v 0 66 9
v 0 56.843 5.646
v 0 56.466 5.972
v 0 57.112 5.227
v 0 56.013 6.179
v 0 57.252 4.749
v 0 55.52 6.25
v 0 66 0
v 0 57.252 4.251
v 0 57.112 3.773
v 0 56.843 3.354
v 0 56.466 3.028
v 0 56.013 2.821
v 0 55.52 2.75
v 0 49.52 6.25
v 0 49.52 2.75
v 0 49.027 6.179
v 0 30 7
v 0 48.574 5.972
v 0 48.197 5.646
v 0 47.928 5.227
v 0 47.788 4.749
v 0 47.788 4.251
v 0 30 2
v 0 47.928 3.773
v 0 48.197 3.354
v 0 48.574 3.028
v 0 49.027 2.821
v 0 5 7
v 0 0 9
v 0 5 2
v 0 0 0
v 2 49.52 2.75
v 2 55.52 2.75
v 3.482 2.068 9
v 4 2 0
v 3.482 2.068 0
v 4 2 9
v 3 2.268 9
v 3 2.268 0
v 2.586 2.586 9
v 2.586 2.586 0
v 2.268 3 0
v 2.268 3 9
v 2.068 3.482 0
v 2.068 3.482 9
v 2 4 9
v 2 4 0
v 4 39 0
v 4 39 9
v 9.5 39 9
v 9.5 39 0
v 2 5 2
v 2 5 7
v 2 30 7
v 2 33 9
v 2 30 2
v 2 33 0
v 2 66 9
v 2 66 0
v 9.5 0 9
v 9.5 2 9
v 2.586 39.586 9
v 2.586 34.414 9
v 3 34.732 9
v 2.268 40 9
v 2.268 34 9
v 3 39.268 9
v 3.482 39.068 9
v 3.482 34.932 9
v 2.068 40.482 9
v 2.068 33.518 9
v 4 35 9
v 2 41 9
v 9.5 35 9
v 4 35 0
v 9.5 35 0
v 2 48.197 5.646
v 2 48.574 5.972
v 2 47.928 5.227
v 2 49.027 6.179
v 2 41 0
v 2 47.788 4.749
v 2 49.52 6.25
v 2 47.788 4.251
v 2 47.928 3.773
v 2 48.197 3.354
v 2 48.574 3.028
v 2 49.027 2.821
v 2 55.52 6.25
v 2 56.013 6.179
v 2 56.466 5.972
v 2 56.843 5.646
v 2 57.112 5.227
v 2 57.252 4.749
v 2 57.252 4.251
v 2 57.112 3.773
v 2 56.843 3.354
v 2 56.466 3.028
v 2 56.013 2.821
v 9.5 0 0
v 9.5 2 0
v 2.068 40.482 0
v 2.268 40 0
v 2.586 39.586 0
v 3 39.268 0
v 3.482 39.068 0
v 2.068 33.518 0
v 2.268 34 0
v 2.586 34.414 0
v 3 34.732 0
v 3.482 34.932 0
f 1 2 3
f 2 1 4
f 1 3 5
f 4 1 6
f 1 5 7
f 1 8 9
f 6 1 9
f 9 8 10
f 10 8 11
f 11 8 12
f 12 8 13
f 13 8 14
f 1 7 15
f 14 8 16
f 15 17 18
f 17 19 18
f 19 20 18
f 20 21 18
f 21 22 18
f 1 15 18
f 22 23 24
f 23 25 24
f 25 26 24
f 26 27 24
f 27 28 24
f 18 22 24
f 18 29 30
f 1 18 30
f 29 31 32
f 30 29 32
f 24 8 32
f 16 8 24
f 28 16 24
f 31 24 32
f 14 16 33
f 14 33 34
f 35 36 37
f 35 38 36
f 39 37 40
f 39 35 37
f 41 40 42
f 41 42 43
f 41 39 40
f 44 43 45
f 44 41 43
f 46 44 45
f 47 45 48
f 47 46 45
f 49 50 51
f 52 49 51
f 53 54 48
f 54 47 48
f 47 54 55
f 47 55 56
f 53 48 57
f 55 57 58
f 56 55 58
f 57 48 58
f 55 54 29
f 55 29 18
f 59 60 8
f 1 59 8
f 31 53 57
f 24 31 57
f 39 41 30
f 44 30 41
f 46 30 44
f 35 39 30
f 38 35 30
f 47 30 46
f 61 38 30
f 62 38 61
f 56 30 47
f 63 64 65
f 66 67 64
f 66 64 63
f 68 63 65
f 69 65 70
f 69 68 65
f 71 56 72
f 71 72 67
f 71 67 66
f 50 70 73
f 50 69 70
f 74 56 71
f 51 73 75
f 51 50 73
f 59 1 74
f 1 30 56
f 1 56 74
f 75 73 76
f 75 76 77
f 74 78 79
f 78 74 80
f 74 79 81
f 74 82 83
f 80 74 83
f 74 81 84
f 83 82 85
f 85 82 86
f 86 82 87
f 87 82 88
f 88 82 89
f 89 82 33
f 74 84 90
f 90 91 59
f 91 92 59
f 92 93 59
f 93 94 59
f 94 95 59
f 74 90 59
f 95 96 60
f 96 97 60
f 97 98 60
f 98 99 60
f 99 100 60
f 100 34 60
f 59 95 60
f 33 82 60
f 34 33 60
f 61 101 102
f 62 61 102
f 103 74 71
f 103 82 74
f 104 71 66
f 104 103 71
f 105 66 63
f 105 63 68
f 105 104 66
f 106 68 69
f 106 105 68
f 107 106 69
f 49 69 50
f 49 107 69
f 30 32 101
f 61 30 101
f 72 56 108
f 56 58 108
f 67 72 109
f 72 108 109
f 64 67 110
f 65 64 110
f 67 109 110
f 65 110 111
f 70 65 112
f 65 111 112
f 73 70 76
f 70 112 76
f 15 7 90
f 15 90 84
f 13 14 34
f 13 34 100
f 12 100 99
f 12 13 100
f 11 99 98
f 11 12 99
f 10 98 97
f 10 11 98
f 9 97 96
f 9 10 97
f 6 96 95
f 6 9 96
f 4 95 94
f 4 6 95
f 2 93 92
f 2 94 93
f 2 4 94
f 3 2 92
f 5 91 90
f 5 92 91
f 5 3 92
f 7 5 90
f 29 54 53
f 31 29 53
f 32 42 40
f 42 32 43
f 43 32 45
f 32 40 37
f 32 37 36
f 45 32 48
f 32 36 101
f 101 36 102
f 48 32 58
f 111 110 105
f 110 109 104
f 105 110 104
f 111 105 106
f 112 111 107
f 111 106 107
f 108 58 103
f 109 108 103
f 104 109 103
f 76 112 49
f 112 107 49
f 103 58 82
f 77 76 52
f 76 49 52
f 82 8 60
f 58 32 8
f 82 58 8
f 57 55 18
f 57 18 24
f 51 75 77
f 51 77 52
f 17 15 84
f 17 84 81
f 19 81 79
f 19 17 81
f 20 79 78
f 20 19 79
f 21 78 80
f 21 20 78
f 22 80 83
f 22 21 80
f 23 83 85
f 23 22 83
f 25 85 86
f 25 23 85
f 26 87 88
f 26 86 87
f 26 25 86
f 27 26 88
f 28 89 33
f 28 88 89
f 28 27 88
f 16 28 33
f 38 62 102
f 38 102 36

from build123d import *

# Parameters (mm, degrees)
EXTRUDE_1_DEPTH     = 9
CUT_EXTRUDE_2_DEPTH = 68.284842275
SKETCH_6_W          = 5
SKETCH_6_H          = 25
CUT_EXTRUDE_3_DEPTH = 68.031708915
FILLET_1_R          = 2
SKETCH_7_W          = 7.5
SKETCH_7_H          = 4
EXTRUDE_2_DEPTH     = 9
FILLET_2_R          = 2


with BuildPart() as part:
    # Эскиз1 → Бобышка-Вытянуть1 (new body)
    with BuildSketch(Plane.XY):
        Polygon((0, 0), (9.5, 0), (9.5, 2), (2, 2), (2, 66), (0, 66), align=None)
    extrude(amount=EXTRUDE_1_DEPTH)

    # Эскиз4 → Вырез-Вытянуть2 (cut, through all)
    with BuildSketch(Plane.ZY):
        with BuildLine():
            Line((6.25, 55.52), (6.25, 49.52))
            ThreePointArc((6.25, 49.52), (4.5, 47.77), (2.75, 49.52))
            Line((2.75, 49.52), (2.75, 55.52))
            ThreePointArc((2.75, 55.52), (4.5, 57.27), (6.25, 55.52))
        make_face()
    extrude(amount=-CUT_EXTRUDE_2_DEPTH, mode=Mode.SUBTRACT)

    # Эскиз6 → Вырез-Вытянуть3 (cut, through all)
    with BuildSketch(Plane(origin=(2, 0, 0), x_dir=(0, 0, -1), z_dir=(1, 0, 0))):
        with Locations((-4.5, 17.5)):
            Rectangle(SKETCH_6_W, SKETCH_6_H)
    extrude(amount=-CUT_EXTRUDE_3_DEPTH, mode=Mode.SUBTRACT)

    # Скругление1
    fillet_1_edges = [part.edges().sort_by_distance(p)[0] for p in [
        (2, 2, 4.5),
    ]]
    fillet(fillet_1_edges, radius=FILLET_1_R)

    # Эскиз7 → Бобышка-Вытянуть2 (add)
    with BuildSketch(Plane.XY.offset(9)):
        with Locations((5.75, 37)):
            Rectangle(SKETCH_7_W, SKETCH_7_H)
    extrude(amount=-EXTRUDE_2_DEPTH)

    # Скругление2
    fillet_2_edges = [part.edges().sort_by_distance(p)[0] for p in [
        (2, 39, 4.5),
        (2, 35, 4.5),
    ]]
    fillet(fillet_2_edges, radius=FILLET_2_R)


solid = part.part
